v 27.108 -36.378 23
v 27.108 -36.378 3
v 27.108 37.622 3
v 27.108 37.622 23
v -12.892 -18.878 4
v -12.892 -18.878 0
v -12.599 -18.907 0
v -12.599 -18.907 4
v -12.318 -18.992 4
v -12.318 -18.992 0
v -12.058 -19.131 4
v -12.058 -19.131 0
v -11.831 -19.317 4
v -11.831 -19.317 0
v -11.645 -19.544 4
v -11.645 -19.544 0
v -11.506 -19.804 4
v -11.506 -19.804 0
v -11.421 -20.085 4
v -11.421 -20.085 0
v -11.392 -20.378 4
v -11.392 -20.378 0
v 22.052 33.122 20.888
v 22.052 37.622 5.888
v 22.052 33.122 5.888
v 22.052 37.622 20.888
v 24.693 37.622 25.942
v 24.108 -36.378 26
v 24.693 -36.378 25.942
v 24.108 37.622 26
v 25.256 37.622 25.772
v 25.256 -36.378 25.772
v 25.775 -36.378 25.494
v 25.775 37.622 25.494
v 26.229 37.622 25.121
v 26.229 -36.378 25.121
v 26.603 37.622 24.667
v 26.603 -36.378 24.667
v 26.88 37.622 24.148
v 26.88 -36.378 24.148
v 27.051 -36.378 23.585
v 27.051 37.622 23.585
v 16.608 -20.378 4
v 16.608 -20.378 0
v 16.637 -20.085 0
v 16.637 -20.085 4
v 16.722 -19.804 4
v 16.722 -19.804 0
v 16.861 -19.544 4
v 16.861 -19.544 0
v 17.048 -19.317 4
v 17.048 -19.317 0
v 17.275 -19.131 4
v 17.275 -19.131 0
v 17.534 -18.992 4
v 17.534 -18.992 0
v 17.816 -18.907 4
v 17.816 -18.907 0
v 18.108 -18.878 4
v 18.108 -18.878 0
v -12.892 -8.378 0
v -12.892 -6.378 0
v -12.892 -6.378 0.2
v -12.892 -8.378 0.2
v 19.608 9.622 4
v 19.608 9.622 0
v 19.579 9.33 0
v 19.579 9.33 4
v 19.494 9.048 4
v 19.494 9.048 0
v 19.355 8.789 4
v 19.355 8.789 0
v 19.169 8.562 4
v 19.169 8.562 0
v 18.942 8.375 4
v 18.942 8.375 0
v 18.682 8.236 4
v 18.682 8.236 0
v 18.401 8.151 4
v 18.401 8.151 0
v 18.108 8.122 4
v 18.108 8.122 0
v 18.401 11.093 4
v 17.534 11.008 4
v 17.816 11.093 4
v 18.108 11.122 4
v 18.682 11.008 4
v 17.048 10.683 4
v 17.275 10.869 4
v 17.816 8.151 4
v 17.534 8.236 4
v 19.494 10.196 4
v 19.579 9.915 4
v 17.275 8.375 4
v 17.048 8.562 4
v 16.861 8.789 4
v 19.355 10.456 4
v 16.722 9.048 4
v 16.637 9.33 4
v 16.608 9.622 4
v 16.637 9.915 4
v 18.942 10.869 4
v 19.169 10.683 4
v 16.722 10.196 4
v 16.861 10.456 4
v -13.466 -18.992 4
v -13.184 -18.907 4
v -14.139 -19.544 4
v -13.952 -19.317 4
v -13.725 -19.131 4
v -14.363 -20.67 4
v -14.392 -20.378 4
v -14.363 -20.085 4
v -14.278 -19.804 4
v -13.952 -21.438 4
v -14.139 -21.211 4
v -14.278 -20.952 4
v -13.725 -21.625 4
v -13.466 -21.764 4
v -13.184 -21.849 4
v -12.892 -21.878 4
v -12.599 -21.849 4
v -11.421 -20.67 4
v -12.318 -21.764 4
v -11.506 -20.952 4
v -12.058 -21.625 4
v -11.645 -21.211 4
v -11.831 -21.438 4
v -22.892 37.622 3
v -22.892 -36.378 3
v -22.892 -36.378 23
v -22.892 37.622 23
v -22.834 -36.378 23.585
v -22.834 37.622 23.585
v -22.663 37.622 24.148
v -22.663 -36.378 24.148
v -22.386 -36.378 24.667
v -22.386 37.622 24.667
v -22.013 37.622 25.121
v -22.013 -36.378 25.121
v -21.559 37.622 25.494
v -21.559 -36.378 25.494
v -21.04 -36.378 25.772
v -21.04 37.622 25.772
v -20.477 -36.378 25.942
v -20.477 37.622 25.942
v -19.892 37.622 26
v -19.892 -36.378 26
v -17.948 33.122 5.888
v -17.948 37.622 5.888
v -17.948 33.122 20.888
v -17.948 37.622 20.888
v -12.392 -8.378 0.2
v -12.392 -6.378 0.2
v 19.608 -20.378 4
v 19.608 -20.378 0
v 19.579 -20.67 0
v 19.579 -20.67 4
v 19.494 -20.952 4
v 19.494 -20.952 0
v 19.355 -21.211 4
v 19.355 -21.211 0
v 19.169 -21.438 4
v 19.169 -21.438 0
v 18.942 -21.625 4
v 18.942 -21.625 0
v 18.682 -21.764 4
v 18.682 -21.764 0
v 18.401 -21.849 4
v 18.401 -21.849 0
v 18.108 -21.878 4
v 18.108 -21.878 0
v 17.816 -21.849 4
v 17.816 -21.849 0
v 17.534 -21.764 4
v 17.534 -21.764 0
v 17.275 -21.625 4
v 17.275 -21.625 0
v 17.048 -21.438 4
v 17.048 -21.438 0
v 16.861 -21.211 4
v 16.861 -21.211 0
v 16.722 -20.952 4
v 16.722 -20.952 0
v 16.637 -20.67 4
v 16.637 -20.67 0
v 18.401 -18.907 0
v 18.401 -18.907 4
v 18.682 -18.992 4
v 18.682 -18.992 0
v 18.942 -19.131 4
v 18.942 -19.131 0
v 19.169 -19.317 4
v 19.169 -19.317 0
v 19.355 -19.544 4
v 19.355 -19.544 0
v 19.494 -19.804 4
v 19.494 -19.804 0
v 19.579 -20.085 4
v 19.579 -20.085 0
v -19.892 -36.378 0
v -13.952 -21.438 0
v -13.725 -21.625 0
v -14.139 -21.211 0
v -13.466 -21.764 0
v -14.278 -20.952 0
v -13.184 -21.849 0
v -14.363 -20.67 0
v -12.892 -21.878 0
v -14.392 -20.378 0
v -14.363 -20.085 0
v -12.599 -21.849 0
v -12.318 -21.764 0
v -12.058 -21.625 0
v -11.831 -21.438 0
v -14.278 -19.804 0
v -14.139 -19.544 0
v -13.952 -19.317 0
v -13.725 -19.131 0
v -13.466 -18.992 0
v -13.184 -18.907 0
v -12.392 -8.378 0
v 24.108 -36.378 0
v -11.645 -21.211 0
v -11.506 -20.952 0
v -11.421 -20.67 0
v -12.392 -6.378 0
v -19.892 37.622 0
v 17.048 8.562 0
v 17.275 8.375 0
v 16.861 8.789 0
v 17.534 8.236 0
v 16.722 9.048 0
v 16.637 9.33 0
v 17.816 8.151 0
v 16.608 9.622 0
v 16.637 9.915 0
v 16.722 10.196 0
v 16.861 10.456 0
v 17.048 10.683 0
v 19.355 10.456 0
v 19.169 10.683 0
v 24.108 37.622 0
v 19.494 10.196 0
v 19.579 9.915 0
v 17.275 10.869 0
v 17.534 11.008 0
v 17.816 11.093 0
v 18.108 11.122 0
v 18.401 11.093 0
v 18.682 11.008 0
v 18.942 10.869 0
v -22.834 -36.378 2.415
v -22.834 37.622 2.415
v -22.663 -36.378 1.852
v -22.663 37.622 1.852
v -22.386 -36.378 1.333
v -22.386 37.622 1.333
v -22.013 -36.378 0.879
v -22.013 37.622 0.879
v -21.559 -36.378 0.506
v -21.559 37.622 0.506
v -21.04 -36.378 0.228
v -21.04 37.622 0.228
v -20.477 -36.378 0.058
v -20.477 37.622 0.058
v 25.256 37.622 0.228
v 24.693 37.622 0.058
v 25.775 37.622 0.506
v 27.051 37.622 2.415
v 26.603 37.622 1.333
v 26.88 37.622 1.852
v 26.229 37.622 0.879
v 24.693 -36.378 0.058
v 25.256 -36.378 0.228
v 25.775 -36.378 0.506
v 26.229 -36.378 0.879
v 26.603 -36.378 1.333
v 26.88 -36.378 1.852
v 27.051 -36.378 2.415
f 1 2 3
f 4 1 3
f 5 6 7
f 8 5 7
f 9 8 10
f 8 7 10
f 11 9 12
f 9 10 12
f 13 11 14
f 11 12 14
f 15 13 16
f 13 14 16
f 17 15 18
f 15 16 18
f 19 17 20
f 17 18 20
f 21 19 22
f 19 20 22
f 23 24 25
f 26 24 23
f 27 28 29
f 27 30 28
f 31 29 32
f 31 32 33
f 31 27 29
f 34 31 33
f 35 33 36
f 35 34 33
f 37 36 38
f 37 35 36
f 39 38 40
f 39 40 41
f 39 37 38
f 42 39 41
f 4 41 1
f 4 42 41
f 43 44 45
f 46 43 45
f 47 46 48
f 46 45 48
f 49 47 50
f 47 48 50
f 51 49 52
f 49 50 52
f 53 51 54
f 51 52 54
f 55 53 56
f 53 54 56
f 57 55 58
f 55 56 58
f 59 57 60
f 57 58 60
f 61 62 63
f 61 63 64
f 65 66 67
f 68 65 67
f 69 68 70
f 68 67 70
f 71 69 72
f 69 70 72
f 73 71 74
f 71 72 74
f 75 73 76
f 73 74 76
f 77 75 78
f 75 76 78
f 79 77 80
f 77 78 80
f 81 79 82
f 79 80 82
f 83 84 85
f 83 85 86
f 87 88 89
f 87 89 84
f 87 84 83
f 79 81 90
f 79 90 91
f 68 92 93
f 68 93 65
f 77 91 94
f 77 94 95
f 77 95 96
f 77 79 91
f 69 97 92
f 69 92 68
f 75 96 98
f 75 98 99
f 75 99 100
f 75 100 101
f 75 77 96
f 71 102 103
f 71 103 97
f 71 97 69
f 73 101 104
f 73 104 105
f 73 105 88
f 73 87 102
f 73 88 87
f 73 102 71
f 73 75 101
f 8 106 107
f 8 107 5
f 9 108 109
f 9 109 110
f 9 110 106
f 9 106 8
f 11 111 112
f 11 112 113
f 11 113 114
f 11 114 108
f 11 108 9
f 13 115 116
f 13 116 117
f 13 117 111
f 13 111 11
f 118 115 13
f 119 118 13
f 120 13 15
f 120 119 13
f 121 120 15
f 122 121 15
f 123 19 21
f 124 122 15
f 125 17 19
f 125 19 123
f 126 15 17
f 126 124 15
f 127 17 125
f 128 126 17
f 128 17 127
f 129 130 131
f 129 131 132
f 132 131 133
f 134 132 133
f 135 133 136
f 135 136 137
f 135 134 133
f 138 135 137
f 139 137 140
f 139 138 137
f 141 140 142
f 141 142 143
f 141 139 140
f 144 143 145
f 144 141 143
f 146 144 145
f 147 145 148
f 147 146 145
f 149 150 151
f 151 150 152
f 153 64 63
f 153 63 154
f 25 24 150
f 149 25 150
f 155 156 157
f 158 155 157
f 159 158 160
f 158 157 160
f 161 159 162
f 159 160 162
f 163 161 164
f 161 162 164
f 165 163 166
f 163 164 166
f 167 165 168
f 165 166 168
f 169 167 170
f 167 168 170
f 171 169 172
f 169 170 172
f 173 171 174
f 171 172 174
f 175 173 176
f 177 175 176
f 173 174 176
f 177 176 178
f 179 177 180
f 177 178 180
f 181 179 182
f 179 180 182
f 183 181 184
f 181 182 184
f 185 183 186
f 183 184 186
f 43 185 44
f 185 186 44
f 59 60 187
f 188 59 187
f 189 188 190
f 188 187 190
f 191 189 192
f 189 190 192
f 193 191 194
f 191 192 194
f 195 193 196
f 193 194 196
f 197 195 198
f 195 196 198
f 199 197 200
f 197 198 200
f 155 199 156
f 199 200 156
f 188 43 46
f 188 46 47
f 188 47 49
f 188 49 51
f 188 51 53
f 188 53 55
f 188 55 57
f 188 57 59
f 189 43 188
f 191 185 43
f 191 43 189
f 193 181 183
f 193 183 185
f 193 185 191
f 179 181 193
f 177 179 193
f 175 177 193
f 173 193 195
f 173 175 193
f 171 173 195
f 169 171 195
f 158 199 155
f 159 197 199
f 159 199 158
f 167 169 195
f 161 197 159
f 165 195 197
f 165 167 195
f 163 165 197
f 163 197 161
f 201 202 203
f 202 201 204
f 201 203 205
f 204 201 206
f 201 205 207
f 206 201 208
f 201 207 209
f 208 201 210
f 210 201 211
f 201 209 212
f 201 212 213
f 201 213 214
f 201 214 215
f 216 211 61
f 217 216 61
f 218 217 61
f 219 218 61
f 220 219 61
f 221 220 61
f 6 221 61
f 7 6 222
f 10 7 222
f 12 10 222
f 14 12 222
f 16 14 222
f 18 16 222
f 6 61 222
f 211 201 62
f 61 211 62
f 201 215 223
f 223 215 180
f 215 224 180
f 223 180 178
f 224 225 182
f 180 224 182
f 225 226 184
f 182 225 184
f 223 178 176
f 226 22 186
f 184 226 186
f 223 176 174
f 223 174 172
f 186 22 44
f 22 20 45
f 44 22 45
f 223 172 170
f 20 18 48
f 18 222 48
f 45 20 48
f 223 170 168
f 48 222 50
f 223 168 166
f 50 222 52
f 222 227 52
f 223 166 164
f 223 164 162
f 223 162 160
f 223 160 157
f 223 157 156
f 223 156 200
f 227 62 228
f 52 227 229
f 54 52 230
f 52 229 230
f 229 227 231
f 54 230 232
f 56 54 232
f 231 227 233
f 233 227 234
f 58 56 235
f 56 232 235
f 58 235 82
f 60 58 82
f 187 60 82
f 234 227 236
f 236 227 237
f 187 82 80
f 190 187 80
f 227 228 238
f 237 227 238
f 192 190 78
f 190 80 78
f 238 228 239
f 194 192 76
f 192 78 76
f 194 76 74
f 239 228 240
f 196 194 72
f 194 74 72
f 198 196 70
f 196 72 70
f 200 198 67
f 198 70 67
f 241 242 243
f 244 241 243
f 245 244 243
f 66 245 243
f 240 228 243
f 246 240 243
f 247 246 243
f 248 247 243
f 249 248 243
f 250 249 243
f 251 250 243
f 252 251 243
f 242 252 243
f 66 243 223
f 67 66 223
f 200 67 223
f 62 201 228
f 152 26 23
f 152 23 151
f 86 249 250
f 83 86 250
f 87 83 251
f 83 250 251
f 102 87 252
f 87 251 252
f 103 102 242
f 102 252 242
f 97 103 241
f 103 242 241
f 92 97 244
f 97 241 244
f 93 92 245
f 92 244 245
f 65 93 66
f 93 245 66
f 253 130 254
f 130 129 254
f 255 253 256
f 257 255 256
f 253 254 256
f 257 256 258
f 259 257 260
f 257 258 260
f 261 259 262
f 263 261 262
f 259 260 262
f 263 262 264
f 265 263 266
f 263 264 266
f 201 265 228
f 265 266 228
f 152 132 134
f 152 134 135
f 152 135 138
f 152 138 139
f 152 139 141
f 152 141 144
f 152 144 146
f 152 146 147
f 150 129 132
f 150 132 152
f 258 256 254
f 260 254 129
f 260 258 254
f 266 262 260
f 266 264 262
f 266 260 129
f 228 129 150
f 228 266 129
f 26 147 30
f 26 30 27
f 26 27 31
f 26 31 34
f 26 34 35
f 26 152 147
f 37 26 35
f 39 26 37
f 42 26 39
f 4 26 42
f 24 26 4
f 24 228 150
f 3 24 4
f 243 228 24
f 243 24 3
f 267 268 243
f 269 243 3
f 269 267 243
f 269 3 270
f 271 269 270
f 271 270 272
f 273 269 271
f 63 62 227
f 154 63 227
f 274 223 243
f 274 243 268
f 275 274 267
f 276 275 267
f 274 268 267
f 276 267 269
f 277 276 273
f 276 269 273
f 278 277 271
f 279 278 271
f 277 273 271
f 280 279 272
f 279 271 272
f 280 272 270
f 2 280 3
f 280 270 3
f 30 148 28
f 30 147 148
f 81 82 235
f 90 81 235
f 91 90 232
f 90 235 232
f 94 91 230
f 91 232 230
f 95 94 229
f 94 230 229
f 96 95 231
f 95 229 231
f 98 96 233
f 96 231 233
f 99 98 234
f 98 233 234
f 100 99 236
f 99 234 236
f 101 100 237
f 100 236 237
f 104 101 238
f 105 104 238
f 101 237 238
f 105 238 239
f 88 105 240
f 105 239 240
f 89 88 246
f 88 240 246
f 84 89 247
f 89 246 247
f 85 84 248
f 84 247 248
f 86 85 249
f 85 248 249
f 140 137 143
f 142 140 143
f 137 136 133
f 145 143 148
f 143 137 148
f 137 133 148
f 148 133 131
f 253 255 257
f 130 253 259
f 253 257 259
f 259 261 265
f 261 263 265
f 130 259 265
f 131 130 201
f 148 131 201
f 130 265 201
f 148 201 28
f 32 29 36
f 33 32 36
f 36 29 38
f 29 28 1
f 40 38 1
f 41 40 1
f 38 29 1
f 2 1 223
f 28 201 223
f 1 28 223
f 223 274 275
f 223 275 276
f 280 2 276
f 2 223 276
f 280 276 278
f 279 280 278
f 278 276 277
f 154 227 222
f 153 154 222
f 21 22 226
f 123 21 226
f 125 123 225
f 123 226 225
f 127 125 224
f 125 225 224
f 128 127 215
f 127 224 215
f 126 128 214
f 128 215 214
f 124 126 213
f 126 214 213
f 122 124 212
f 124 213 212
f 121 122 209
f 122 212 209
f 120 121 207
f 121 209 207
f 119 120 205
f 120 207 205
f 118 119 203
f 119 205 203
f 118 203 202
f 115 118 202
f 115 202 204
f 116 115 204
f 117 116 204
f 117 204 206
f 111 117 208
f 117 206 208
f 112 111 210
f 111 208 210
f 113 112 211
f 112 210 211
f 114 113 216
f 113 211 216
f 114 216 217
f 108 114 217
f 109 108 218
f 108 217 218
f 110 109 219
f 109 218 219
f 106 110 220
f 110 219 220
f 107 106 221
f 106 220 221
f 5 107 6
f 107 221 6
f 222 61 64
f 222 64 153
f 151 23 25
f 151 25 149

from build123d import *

# Parameters (mm, degrees)
F0_W     = 50
F0_H     = 74
F1_DEPTH = 26
F2_W     = 40
F2_H     = 15
F3_DEPTH = 4.5
F5_R     = 3
F6_DEPTH = 4
F4_W     = 0.5
F4_H     = 2
F7_DEPTH = 0.2


with BuildPart() as f1:
    # F0 (on Top) → F1 (new body)
    with BuildSketch(Plane.XY):
        with Locations((2.1081687883, 0.6221723649)):
            Rectangle(F0_W, F0_H)
    extrude(amount=F1_DEPTH)

    # F2 (on face) → F3 (cut)
    with BuildSketch(Plane(origin=(0, 37.6221723649, 0), x_dir=(-1, 0, 0), z_dir=(0, 1, 0))):
        with Locations((-2.0523197204, 13.3878487907)):
            Rectangle(F2_W, F2_H)
    extrude(amount=-F3_DEPTH, mode=Mode.SUBTRACT)

    # F5
    f5_edges = [f1.edges().sort_by_distance(p)[0] for p in [
        (27.108169, 0.622172, 0),
        (27.108169, 0.622172, 26),
        (-22.891831, 0.622172, 0),
        (-22.891831, 0.622172, 26),
    ]]
    fillet(f5_edges, radius=F5_R)

    # F4 (on face) → F6 (cut)
    with BuildSketch(Plane(origin=(0, 0, 0), x_dir=(1, 0, 0), z_dir=(0, 0, -1))):
        with BuildLine():
            Line((18.1081687883, 20.3778276351), (18.1081687883, 18.8778276351))
            ThreePointArc((18.1081687883, 18.8778276351), (19.16882896, 19.3171674633), (19.6081687883, 20.3778276351))
            ThreePointArc((19.6081687883, 20.3778276351), (18.1081687883, 21.8778276351), (16.6081687883, 20.3778276351))
            Line((16.6081687883, 20.3778276351), (18.1081687883, 20.3778276351))
        make_face()
        with BuildLine():
            ThreePointArc((16.6081687883, 20.3778276351), (17.0475086165, 19.3171674633), (18.1081687883, 18.8778276351))
            Line((18.1081687883, 18.8778276351), (18.1081687883, 20.3778276351))
            Line((18.1081687883, 20.3778276351), (16.6081687883, 20.3778276351))
        make_face()
        with BuildLine():
            Line((-12.8918312117, 20.3778276351), (-11.3918312117, 20.3778276351))
            ThreePointArc((-11.3918312117, 20.3778276351), (-13.9524913835, 21.4384878068), (-12.8918312117, 18.8778276351))
            Line((-12.8918312117, 18.8778276351), (-12.8918312117, 20.3778276351))
        make_face()
        with BuildLine():
            ThreePointArc((-12.8918312117, 18.8778276351), (-11.83117104, 19.3171674633), (-11.3918312117, 20.3778276351))
            Line((-11.3918312117, 20.3778276351), (-12.8918312117, 20.3778276351))
            Line((-12.8918312117, 20.3778276351), (-12.8918312117, 18.8778276351))
        make_face()
        with BuildLine():
            ThreePointArc((18.1081687883, -8.1221723649), (16.6081687883, -9.6221723649), (18.1081687883, -11.1221723649))
            Line((18.1081687883, -11.1221723649), (18.1081687883, -9.6221723649))
            Line((18.1081687883, -9.6221723649), (18.1081687883, -8.1221723649))
        make_face()
        with BuildLine():
            Line((18.1081687883, -9.6221723649), (18.1081687883, -11.1221723649))
            ThreePointArc((18.1081687883, -11.1221723649), (19.16882896, -10.6828325367), (19.6081687883, -9.6221723649))
            ThreePointArc((19.6081687883, -9.6221723649), (19.16882896, -8.5615121932), (18.1081687883, -8.1221723649))
            Line((18.1081687883, -8.1221723649), (18.1081687883, -9.6221723649))
        make_face()
    extrude(amount=-F6_DEPTH, mode=Mode.SUBTRACT)

    # F4 (on face) → F7 (cut)
    with BuildSketch(Plane(origin=(0, 0, 0), x_dir=(1, 0, 0), z_dir=(0, 0, -1))):
        with Locations((-12.6418312117, 7.3778276351)):
            Rectangle(F4_W, F4_H)
    extrude(amount=-F7_DEPTH, mode=Mode.SUBTRACT)


solid = f1.part
